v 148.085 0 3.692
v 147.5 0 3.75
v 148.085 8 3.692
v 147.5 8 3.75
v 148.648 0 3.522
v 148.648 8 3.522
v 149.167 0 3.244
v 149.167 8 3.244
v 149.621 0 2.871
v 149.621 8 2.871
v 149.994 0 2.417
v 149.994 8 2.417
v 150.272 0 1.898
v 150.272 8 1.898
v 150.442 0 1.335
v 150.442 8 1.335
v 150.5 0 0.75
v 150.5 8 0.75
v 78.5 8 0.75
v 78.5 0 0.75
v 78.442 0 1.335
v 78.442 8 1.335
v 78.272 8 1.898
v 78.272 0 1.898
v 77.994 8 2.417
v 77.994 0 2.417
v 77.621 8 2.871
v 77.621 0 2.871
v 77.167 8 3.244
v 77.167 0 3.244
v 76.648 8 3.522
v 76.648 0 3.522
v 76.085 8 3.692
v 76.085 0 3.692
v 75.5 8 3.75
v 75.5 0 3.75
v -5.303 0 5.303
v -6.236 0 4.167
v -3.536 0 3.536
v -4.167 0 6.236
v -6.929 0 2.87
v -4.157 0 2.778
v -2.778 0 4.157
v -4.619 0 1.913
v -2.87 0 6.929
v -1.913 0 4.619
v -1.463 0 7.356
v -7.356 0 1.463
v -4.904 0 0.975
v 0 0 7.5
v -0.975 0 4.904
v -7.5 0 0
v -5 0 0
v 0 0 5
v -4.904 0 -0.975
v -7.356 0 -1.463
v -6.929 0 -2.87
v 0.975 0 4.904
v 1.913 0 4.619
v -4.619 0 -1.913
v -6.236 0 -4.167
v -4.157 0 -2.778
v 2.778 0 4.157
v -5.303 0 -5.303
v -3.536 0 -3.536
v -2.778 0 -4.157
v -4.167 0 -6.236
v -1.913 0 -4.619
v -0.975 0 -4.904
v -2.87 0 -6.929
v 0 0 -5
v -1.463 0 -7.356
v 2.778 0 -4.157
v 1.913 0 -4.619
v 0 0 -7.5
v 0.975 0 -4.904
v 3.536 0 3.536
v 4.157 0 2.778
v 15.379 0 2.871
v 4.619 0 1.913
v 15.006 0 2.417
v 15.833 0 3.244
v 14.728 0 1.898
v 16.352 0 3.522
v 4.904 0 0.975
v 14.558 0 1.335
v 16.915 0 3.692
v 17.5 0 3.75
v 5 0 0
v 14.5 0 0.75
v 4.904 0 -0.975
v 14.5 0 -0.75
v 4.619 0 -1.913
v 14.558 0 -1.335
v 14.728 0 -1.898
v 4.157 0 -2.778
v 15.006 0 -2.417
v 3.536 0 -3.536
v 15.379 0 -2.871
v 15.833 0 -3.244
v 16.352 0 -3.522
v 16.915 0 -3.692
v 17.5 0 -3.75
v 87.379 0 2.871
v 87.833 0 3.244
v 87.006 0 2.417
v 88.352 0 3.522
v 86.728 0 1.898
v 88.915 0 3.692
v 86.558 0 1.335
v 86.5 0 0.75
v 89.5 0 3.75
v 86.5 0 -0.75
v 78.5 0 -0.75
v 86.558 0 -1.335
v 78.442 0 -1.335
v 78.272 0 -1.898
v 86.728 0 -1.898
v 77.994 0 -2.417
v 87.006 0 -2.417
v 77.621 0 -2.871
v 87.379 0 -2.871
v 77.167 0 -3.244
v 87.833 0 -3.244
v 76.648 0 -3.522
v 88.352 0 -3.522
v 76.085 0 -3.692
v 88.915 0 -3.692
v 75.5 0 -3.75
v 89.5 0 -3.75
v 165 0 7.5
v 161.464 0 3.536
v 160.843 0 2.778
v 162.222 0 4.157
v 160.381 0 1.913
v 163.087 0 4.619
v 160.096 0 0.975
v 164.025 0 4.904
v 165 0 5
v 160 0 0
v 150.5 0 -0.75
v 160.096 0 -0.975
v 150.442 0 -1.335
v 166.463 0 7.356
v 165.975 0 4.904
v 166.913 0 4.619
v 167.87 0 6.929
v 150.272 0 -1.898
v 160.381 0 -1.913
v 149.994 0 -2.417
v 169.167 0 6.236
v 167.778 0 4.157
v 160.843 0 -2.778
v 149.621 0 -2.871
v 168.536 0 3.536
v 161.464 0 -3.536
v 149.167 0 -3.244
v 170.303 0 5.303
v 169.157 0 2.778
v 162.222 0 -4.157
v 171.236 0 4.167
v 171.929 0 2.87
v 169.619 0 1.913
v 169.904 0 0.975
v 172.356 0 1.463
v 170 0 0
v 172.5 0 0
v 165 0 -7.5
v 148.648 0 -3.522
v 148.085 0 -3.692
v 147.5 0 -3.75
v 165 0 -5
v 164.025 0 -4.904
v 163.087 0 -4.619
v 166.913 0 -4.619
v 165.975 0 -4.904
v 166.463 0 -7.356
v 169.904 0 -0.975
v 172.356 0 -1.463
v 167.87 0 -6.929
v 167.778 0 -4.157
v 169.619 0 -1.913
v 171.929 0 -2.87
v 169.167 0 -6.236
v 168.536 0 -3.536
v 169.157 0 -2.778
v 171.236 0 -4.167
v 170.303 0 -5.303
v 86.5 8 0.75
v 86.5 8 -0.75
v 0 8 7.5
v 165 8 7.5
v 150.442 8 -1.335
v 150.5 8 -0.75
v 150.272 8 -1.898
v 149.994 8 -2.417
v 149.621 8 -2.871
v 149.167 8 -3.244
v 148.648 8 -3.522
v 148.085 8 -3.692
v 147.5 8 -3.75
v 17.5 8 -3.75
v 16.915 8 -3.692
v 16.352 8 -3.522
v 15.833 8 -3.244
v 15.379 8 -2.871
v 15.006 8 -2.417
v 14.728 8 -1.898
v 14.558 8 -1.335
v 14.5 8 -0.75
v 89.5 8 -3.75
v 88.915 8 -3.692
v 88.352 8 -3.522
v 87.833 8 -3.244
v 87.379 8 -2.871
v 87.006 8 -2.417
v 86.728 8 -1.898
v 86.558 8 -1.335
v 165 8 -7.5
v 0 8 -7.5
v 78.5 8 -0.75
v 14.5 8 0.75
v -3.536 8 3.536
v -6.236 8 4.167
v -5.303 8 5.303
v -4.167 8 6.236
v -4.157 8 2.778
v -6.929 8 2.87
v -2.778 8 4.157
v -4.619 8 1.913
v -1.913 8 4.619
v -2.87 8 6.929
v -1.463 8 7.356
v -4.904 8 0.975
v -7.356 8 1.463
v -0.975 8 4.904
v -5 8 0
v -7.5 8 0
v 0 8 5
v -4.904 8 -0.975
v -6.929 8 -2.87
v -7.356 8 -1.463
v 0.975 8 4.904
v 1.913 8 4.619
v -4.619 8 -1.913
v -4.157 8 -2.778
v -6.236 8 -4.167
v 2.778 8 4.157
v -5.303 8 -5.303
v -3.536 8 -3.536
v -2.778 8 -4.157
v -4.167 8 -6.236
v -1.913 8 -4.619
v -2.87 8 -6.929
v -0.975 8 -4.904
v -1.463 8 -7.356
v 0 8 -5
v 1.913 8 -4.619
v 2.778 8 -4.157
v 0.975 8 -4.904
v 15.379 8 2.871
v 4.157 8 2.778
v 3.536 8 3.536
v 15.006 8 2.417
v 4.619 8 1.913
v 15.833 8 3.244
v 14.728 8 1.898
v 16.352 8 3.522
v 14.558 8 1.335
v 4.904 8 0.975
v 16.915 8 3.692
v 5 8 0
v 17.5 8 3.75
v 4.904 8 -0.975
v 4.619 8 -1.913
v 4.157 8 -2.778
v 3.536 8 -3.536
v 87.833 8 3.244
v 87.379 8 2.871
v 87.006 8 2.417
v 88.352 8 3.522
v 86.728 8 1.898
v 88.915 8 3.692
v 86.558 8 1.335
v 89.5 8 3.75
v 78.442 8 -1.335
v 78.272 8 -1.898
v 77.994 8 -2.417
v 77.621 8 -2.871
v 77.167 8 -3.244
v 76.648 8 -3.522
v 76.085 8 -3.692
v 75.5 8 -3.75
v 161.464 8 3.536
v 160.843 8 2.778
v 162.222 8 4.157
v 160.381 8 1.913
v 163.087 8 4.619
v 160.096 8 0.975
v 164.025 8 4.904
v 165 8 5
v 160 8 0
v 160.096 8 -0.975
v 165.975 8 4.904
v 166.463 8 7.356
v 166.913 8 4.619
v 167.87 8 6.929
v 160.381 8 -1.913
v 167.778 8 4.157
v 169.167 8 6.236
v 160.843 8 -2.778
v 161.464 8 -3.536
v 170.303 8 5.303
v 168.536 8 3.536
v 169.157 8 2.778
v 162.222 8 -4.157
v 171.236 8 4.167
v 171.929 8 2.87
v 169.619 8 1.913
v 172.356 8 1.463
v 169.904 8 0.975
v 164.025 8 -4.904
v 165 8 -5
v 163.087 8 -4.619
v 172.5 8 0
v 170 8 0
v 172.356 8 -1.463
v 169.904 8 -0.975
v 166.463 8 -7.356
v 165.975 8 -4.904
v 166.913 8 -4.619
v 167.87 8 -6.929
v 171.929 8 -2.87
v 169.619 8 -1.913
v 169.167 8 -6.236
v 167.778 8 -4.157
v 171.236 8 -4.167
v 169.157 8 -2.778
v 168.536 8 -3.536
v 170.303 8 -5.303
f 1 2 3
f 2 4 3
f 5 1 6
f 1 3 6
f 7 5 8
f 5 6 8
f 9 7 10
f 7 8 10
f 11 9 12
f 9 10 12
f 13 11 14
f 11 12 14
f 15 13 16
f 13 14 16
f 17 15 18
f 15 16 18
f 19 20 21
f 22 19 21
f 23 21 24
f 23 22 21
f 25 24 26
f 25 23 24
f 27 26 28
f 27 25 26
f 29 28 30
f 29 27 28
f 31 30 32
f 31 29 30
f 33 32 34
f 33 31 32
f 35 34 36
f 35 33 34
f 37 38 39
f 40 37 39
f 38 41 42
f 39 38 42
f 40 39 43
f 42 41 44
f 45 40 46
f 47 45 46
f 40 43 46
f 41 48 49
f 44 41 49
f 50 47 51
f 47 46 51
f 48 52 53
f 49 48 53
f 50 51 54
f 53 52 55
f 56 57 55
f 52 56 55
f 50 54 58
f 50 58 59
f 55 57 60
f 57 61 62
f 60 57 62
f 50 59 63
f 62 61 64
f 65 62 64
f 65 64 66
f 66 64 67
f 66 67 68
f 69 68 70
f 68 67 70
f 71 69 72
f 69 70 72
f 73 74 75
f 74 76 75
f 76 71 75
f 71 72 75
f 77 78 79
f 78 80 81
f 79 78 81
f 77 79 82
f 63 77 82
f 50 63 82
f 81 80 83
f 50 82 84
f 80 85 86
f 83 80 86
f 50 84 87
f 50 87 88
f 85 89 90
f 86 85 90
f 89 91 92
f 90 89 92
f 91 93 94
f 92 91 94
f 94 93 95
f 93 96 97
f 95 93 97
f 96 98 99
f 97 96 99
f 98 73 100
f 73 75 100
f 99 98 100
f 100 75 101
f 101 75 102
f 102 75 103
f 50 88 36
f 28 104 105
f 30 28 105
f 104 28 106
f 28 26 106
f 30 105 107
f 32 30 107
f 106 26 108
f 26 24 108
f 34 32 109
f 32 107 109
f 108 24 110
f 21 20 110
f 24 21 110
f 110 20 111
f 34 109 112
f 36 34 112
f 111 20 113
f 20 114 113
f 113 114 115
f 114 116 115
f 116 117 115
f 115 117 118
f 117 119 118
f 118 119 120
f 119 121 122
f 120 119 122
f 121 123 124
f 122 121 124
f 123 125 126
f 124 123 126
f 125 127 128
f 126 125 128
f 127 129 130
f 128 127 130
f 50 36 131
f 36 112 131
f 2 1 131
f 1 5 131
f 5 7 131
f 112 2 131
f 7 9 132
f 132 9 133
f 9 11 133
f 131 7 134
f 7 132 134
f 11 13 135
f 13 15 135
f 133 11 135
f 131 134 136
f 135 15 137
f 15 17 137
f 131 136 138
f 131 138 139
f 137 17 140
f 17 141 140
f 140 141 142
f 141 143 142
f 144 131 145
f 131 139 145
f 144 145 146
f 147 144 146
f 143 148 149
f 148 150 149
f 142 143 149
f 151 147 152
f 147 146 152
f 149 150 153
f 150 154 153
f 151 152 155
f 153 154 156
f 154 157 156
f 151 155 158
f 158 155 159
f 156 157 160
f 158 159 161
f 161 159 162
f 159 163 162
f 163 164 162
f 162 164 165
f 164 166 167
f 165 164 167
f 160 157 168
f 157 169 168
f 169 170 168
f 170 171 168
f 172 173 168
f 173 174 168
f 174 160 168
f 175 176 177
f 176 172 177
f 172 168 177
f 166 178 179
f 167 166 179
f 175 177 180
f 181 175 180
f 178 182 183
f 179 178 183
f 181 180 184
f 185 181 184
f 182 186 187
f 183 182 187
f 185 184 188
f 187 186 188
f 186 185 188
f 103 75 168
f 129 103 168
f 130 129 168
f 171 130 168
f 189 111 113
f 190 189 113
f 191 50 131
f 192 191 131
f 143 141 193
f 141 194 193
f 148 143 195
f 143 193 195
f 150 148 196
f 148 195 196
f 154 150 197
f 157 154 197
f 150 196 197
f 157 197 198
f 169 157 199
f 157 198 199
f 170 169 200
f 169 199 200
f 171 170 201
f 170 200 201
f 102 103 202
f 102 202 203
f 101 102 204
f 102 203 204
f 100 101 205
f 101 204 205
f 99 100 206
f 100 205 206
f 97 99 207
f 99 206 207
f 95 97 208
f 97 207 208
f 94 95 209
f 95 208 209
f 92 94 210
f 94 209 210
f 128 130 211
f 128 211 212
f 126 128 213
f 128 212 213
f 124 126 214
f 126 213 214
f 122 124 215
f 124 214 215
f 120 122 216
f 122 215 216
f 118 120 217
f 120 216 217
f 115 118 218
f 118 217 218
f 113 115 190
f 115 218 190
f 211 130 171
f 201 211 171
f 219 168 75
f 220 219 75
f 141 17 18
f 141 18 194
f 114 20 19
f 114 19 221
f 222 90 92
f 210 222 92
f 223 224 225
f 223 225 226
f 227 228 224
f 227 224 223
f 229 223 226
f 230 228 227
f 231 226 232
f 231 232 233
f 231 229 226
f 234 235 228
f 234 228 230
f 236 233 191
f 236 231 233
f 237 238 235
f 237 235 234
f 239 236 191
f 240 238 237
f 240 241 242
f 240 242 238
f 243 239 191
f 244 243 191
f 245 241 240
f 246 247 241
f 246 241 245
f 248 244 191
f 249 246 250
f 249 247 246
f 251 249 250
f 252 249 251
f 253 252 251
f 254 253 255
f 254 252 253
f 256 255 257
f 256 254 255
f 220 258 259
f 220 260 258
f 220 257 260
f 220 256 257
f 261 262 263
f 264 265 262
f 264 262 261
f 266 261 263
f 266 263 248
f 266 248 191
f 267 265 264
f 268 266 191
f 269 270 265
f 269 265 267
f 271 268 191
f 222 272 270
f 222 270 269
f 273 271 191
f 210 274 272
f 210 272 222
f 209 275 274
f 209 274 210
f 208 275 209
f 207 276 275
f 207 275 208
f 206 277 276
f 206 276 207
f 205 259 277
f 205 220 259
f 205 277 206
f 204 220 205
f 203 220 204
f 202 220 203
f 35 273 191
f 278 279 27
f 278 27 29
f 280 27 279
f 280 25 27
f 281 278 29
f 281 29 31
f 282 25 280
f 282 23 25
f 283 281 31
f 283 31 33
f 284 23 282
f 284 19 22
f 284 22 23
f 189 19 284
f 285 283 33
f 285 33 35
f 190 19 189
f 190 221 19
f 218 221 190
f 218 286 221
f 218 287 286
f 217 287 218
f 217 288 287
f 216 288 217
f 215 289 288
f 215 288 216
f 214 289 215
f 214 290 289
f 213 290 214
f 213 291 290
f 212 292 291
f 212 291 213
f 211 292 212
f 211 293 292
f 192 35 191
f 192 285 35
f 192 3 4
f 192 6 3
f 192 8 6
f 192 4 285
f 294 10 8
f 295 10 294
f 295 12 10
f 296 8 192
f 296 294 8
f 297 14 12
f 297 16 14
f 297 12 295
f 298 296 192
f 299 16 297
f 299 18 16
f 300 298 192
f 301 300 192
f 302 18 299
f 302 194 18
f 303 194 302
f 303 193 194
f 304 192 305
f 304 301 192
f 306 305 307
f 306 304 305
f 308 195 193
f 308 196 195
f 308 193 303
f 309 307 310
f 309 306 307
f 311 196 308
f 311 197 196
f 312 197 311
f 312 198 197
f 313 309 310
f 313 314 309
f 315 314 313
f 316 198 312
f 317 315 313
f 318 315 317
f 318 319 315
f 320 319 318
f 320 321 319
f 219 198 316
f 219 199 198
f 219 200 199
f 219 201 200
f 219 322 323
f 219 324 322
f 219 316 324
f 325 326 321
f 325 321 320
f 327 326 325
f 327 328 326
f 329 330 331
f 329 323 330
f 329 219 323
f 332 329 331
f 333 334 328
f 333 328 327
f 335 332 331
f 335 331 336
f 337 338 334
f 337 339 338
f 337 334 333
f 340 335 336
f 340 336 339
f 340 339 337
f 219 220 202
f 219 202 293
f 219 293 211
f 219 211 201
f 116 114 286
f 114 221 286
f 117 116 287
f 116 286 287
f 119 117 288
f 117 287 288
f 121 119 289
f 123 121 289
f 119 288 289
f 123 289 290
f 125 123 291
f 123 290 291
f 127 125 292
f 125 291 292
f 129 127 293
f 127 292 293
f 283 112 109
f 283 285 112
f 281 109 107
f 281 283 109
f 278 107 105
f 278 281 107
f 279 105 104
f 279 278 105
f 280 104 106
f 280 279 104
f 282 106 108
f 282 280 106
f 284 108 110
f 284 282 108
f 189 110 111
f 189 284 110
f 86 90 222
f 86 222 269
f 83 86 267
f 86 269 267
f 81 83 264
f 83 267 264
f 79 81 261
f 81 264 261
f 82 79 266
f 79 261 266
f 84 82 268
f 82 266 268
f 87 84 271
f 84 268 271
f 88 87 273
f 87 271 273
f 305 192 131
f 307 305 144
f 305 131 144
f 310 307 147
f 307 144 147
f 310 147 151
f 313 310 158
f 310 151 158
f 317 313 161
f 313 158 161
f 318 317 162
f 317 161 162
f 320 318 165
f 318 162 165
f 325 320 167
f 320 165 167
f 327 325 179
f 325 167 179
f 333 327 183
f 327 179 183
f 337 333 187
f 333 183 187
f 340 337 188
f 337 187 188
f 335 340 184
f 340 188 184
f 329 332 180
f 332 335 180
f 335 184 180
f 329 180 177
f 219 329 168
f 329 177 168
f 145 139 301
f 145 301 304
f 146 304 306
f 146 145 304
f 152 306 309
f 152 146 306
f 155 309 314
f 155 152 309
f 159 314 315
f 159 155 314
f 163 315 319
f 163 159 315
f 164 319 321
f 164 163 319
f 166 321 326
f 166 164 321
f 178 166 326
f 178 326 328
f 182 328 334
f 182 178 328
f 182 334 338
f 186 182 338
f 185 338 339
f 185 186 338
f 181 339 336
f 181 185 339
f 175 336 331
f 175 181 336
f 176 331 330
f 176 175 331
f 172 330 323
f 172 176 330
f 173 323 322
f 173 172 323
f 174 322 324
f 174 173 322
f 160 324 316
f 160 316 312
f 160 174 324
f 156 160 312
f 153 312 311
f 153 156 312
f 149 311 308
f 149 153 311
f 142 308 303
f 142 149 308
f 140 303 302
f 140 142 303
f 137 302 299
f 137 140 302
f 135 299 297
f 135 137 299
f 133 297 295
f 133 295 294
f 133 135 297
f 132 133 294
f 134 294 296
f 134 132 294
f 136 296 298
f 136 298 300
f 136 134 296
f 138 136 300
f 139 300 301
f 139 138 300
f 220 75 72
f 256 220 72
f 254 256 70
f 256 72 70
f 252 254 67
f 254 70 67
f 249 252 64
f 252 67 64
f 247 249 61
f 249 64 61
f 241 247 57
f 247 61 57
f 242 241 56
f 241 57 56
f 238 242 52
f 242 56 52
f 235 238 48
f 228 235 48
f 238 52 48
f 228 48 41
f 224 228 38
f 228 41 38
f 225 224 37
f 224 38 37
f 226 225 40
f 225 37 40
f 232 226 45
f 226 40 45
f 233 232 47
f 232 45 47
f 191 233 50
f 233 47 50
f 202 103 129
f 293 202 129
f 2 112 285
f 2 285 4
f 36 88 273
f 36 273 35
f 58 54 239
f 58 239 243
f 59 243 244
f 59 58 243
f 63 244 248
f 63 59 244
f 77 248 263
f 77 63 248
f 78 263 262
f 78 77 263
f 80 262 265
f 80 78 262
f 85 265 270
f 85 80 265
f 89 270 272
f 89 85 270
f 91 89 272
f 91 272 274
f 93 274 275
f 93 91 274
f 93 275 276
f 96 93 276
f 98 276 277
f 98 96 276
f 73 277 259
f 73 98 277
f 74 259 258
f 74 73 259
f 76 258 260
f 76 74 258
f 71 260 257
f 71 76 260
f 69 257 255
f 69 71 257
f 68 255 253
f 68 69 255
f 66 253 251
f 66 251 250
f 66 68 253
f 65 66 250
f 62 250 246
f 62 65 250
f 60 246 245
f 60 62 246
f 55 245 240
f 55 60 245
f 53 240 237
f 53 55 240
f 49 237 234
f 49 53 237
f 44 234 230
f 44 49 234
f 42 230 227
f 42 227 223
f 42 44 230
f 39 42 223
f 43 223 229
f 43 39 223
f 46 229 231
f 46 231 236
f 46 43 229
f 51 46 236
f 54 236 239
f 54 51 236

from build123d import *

# Parameters (mm, degrees)
SKETCH_1_W      = 64
SKETCH_1_H      = 7.5
SKETCH_1_R      = 7.5
SKETCH_1_R_2    = 5
EXTRUDE_1_DEPTH = 8
FILLET_1_R      = 3


with BuildPart() as part:
    # 草图1 → 凸台-拉伸1 (new body)
    # profile 1 of 3: a face of its own
    with BuildSketch(Plane(origin=(0, 0, 0), x_dir=(1, 0, 0), z_dir=(0, 1, 0))):
        with BuildLine():
            Line((165, 7.5), (0, 7.5))
            ThreePointArc((0, 7.5), (5.303300859, 5.303300859), (7.5, 0))
            ThreePointArc((7.5, 0), (5.303300859, -5.303300859), (0, -7.5))
            Line((0, -7.5), (165, -7.5))
            ThreePointArc((165, -7.5), (157.5, 0), (165, 7.5))
        make_face()
        with Locations((46.5, 0)):
            Rectangle(SKETCH_1_W, SKETCH_1_H, mode=Mode.SUBTRACT)
        with Locations((118.5, 0)):
            Rectangle(SKETCH_1_W, SKETCH_1_H, mode=Mode.SUBTRACT)
    # profile 2 of 3: a face of its own
    with BuildSketch(Plane(origin=(0, 0, 0), x_dir=(1, 0, 0), z_dir=(0, 1, 0))):
        Circle(SKETCH_1_R)
        with Locations(Location((0, 0, 0), (0, 0, 270))):
            Circle(SKETCH_1_R_2, mode=Mode.SUBTRACT)
    # profile 3 of 3: a face of its own
    with BuildSketch(Plane(origin=(0, 0, 0), x_dir=(1, 0, 0), z_dir=(0, 1, 0))):
        with Locations((165, 0)):
            Circle(SKETCH_1_R)
        with Locations(Location((165, 0, 0), (0, 0, 270))):
            Circle(SKETCH_1_R_2, mode=Mode.SUBTRACT)
    extrude(amount=EXTRUDE_1_DEPTH)

    # 圆角1
    fillet_1_edges = [part.edges().sort_by_distance(p)[0] for p in [
        (86.5, 4, -3.75),
        (86.5, 4, 3.75),
        (150.5, 4, 3.75),
        (150.5, 4, -3.75),
        (14.5, 4, -3.75),
        (14.5, 4, 3.75),
        (78.5, 4, 3.75),
        (78.5, 4, -3.75),
    ]]
    fillet(fillet_1_edges, radius=FILLET_1_R)


solid = part.part
